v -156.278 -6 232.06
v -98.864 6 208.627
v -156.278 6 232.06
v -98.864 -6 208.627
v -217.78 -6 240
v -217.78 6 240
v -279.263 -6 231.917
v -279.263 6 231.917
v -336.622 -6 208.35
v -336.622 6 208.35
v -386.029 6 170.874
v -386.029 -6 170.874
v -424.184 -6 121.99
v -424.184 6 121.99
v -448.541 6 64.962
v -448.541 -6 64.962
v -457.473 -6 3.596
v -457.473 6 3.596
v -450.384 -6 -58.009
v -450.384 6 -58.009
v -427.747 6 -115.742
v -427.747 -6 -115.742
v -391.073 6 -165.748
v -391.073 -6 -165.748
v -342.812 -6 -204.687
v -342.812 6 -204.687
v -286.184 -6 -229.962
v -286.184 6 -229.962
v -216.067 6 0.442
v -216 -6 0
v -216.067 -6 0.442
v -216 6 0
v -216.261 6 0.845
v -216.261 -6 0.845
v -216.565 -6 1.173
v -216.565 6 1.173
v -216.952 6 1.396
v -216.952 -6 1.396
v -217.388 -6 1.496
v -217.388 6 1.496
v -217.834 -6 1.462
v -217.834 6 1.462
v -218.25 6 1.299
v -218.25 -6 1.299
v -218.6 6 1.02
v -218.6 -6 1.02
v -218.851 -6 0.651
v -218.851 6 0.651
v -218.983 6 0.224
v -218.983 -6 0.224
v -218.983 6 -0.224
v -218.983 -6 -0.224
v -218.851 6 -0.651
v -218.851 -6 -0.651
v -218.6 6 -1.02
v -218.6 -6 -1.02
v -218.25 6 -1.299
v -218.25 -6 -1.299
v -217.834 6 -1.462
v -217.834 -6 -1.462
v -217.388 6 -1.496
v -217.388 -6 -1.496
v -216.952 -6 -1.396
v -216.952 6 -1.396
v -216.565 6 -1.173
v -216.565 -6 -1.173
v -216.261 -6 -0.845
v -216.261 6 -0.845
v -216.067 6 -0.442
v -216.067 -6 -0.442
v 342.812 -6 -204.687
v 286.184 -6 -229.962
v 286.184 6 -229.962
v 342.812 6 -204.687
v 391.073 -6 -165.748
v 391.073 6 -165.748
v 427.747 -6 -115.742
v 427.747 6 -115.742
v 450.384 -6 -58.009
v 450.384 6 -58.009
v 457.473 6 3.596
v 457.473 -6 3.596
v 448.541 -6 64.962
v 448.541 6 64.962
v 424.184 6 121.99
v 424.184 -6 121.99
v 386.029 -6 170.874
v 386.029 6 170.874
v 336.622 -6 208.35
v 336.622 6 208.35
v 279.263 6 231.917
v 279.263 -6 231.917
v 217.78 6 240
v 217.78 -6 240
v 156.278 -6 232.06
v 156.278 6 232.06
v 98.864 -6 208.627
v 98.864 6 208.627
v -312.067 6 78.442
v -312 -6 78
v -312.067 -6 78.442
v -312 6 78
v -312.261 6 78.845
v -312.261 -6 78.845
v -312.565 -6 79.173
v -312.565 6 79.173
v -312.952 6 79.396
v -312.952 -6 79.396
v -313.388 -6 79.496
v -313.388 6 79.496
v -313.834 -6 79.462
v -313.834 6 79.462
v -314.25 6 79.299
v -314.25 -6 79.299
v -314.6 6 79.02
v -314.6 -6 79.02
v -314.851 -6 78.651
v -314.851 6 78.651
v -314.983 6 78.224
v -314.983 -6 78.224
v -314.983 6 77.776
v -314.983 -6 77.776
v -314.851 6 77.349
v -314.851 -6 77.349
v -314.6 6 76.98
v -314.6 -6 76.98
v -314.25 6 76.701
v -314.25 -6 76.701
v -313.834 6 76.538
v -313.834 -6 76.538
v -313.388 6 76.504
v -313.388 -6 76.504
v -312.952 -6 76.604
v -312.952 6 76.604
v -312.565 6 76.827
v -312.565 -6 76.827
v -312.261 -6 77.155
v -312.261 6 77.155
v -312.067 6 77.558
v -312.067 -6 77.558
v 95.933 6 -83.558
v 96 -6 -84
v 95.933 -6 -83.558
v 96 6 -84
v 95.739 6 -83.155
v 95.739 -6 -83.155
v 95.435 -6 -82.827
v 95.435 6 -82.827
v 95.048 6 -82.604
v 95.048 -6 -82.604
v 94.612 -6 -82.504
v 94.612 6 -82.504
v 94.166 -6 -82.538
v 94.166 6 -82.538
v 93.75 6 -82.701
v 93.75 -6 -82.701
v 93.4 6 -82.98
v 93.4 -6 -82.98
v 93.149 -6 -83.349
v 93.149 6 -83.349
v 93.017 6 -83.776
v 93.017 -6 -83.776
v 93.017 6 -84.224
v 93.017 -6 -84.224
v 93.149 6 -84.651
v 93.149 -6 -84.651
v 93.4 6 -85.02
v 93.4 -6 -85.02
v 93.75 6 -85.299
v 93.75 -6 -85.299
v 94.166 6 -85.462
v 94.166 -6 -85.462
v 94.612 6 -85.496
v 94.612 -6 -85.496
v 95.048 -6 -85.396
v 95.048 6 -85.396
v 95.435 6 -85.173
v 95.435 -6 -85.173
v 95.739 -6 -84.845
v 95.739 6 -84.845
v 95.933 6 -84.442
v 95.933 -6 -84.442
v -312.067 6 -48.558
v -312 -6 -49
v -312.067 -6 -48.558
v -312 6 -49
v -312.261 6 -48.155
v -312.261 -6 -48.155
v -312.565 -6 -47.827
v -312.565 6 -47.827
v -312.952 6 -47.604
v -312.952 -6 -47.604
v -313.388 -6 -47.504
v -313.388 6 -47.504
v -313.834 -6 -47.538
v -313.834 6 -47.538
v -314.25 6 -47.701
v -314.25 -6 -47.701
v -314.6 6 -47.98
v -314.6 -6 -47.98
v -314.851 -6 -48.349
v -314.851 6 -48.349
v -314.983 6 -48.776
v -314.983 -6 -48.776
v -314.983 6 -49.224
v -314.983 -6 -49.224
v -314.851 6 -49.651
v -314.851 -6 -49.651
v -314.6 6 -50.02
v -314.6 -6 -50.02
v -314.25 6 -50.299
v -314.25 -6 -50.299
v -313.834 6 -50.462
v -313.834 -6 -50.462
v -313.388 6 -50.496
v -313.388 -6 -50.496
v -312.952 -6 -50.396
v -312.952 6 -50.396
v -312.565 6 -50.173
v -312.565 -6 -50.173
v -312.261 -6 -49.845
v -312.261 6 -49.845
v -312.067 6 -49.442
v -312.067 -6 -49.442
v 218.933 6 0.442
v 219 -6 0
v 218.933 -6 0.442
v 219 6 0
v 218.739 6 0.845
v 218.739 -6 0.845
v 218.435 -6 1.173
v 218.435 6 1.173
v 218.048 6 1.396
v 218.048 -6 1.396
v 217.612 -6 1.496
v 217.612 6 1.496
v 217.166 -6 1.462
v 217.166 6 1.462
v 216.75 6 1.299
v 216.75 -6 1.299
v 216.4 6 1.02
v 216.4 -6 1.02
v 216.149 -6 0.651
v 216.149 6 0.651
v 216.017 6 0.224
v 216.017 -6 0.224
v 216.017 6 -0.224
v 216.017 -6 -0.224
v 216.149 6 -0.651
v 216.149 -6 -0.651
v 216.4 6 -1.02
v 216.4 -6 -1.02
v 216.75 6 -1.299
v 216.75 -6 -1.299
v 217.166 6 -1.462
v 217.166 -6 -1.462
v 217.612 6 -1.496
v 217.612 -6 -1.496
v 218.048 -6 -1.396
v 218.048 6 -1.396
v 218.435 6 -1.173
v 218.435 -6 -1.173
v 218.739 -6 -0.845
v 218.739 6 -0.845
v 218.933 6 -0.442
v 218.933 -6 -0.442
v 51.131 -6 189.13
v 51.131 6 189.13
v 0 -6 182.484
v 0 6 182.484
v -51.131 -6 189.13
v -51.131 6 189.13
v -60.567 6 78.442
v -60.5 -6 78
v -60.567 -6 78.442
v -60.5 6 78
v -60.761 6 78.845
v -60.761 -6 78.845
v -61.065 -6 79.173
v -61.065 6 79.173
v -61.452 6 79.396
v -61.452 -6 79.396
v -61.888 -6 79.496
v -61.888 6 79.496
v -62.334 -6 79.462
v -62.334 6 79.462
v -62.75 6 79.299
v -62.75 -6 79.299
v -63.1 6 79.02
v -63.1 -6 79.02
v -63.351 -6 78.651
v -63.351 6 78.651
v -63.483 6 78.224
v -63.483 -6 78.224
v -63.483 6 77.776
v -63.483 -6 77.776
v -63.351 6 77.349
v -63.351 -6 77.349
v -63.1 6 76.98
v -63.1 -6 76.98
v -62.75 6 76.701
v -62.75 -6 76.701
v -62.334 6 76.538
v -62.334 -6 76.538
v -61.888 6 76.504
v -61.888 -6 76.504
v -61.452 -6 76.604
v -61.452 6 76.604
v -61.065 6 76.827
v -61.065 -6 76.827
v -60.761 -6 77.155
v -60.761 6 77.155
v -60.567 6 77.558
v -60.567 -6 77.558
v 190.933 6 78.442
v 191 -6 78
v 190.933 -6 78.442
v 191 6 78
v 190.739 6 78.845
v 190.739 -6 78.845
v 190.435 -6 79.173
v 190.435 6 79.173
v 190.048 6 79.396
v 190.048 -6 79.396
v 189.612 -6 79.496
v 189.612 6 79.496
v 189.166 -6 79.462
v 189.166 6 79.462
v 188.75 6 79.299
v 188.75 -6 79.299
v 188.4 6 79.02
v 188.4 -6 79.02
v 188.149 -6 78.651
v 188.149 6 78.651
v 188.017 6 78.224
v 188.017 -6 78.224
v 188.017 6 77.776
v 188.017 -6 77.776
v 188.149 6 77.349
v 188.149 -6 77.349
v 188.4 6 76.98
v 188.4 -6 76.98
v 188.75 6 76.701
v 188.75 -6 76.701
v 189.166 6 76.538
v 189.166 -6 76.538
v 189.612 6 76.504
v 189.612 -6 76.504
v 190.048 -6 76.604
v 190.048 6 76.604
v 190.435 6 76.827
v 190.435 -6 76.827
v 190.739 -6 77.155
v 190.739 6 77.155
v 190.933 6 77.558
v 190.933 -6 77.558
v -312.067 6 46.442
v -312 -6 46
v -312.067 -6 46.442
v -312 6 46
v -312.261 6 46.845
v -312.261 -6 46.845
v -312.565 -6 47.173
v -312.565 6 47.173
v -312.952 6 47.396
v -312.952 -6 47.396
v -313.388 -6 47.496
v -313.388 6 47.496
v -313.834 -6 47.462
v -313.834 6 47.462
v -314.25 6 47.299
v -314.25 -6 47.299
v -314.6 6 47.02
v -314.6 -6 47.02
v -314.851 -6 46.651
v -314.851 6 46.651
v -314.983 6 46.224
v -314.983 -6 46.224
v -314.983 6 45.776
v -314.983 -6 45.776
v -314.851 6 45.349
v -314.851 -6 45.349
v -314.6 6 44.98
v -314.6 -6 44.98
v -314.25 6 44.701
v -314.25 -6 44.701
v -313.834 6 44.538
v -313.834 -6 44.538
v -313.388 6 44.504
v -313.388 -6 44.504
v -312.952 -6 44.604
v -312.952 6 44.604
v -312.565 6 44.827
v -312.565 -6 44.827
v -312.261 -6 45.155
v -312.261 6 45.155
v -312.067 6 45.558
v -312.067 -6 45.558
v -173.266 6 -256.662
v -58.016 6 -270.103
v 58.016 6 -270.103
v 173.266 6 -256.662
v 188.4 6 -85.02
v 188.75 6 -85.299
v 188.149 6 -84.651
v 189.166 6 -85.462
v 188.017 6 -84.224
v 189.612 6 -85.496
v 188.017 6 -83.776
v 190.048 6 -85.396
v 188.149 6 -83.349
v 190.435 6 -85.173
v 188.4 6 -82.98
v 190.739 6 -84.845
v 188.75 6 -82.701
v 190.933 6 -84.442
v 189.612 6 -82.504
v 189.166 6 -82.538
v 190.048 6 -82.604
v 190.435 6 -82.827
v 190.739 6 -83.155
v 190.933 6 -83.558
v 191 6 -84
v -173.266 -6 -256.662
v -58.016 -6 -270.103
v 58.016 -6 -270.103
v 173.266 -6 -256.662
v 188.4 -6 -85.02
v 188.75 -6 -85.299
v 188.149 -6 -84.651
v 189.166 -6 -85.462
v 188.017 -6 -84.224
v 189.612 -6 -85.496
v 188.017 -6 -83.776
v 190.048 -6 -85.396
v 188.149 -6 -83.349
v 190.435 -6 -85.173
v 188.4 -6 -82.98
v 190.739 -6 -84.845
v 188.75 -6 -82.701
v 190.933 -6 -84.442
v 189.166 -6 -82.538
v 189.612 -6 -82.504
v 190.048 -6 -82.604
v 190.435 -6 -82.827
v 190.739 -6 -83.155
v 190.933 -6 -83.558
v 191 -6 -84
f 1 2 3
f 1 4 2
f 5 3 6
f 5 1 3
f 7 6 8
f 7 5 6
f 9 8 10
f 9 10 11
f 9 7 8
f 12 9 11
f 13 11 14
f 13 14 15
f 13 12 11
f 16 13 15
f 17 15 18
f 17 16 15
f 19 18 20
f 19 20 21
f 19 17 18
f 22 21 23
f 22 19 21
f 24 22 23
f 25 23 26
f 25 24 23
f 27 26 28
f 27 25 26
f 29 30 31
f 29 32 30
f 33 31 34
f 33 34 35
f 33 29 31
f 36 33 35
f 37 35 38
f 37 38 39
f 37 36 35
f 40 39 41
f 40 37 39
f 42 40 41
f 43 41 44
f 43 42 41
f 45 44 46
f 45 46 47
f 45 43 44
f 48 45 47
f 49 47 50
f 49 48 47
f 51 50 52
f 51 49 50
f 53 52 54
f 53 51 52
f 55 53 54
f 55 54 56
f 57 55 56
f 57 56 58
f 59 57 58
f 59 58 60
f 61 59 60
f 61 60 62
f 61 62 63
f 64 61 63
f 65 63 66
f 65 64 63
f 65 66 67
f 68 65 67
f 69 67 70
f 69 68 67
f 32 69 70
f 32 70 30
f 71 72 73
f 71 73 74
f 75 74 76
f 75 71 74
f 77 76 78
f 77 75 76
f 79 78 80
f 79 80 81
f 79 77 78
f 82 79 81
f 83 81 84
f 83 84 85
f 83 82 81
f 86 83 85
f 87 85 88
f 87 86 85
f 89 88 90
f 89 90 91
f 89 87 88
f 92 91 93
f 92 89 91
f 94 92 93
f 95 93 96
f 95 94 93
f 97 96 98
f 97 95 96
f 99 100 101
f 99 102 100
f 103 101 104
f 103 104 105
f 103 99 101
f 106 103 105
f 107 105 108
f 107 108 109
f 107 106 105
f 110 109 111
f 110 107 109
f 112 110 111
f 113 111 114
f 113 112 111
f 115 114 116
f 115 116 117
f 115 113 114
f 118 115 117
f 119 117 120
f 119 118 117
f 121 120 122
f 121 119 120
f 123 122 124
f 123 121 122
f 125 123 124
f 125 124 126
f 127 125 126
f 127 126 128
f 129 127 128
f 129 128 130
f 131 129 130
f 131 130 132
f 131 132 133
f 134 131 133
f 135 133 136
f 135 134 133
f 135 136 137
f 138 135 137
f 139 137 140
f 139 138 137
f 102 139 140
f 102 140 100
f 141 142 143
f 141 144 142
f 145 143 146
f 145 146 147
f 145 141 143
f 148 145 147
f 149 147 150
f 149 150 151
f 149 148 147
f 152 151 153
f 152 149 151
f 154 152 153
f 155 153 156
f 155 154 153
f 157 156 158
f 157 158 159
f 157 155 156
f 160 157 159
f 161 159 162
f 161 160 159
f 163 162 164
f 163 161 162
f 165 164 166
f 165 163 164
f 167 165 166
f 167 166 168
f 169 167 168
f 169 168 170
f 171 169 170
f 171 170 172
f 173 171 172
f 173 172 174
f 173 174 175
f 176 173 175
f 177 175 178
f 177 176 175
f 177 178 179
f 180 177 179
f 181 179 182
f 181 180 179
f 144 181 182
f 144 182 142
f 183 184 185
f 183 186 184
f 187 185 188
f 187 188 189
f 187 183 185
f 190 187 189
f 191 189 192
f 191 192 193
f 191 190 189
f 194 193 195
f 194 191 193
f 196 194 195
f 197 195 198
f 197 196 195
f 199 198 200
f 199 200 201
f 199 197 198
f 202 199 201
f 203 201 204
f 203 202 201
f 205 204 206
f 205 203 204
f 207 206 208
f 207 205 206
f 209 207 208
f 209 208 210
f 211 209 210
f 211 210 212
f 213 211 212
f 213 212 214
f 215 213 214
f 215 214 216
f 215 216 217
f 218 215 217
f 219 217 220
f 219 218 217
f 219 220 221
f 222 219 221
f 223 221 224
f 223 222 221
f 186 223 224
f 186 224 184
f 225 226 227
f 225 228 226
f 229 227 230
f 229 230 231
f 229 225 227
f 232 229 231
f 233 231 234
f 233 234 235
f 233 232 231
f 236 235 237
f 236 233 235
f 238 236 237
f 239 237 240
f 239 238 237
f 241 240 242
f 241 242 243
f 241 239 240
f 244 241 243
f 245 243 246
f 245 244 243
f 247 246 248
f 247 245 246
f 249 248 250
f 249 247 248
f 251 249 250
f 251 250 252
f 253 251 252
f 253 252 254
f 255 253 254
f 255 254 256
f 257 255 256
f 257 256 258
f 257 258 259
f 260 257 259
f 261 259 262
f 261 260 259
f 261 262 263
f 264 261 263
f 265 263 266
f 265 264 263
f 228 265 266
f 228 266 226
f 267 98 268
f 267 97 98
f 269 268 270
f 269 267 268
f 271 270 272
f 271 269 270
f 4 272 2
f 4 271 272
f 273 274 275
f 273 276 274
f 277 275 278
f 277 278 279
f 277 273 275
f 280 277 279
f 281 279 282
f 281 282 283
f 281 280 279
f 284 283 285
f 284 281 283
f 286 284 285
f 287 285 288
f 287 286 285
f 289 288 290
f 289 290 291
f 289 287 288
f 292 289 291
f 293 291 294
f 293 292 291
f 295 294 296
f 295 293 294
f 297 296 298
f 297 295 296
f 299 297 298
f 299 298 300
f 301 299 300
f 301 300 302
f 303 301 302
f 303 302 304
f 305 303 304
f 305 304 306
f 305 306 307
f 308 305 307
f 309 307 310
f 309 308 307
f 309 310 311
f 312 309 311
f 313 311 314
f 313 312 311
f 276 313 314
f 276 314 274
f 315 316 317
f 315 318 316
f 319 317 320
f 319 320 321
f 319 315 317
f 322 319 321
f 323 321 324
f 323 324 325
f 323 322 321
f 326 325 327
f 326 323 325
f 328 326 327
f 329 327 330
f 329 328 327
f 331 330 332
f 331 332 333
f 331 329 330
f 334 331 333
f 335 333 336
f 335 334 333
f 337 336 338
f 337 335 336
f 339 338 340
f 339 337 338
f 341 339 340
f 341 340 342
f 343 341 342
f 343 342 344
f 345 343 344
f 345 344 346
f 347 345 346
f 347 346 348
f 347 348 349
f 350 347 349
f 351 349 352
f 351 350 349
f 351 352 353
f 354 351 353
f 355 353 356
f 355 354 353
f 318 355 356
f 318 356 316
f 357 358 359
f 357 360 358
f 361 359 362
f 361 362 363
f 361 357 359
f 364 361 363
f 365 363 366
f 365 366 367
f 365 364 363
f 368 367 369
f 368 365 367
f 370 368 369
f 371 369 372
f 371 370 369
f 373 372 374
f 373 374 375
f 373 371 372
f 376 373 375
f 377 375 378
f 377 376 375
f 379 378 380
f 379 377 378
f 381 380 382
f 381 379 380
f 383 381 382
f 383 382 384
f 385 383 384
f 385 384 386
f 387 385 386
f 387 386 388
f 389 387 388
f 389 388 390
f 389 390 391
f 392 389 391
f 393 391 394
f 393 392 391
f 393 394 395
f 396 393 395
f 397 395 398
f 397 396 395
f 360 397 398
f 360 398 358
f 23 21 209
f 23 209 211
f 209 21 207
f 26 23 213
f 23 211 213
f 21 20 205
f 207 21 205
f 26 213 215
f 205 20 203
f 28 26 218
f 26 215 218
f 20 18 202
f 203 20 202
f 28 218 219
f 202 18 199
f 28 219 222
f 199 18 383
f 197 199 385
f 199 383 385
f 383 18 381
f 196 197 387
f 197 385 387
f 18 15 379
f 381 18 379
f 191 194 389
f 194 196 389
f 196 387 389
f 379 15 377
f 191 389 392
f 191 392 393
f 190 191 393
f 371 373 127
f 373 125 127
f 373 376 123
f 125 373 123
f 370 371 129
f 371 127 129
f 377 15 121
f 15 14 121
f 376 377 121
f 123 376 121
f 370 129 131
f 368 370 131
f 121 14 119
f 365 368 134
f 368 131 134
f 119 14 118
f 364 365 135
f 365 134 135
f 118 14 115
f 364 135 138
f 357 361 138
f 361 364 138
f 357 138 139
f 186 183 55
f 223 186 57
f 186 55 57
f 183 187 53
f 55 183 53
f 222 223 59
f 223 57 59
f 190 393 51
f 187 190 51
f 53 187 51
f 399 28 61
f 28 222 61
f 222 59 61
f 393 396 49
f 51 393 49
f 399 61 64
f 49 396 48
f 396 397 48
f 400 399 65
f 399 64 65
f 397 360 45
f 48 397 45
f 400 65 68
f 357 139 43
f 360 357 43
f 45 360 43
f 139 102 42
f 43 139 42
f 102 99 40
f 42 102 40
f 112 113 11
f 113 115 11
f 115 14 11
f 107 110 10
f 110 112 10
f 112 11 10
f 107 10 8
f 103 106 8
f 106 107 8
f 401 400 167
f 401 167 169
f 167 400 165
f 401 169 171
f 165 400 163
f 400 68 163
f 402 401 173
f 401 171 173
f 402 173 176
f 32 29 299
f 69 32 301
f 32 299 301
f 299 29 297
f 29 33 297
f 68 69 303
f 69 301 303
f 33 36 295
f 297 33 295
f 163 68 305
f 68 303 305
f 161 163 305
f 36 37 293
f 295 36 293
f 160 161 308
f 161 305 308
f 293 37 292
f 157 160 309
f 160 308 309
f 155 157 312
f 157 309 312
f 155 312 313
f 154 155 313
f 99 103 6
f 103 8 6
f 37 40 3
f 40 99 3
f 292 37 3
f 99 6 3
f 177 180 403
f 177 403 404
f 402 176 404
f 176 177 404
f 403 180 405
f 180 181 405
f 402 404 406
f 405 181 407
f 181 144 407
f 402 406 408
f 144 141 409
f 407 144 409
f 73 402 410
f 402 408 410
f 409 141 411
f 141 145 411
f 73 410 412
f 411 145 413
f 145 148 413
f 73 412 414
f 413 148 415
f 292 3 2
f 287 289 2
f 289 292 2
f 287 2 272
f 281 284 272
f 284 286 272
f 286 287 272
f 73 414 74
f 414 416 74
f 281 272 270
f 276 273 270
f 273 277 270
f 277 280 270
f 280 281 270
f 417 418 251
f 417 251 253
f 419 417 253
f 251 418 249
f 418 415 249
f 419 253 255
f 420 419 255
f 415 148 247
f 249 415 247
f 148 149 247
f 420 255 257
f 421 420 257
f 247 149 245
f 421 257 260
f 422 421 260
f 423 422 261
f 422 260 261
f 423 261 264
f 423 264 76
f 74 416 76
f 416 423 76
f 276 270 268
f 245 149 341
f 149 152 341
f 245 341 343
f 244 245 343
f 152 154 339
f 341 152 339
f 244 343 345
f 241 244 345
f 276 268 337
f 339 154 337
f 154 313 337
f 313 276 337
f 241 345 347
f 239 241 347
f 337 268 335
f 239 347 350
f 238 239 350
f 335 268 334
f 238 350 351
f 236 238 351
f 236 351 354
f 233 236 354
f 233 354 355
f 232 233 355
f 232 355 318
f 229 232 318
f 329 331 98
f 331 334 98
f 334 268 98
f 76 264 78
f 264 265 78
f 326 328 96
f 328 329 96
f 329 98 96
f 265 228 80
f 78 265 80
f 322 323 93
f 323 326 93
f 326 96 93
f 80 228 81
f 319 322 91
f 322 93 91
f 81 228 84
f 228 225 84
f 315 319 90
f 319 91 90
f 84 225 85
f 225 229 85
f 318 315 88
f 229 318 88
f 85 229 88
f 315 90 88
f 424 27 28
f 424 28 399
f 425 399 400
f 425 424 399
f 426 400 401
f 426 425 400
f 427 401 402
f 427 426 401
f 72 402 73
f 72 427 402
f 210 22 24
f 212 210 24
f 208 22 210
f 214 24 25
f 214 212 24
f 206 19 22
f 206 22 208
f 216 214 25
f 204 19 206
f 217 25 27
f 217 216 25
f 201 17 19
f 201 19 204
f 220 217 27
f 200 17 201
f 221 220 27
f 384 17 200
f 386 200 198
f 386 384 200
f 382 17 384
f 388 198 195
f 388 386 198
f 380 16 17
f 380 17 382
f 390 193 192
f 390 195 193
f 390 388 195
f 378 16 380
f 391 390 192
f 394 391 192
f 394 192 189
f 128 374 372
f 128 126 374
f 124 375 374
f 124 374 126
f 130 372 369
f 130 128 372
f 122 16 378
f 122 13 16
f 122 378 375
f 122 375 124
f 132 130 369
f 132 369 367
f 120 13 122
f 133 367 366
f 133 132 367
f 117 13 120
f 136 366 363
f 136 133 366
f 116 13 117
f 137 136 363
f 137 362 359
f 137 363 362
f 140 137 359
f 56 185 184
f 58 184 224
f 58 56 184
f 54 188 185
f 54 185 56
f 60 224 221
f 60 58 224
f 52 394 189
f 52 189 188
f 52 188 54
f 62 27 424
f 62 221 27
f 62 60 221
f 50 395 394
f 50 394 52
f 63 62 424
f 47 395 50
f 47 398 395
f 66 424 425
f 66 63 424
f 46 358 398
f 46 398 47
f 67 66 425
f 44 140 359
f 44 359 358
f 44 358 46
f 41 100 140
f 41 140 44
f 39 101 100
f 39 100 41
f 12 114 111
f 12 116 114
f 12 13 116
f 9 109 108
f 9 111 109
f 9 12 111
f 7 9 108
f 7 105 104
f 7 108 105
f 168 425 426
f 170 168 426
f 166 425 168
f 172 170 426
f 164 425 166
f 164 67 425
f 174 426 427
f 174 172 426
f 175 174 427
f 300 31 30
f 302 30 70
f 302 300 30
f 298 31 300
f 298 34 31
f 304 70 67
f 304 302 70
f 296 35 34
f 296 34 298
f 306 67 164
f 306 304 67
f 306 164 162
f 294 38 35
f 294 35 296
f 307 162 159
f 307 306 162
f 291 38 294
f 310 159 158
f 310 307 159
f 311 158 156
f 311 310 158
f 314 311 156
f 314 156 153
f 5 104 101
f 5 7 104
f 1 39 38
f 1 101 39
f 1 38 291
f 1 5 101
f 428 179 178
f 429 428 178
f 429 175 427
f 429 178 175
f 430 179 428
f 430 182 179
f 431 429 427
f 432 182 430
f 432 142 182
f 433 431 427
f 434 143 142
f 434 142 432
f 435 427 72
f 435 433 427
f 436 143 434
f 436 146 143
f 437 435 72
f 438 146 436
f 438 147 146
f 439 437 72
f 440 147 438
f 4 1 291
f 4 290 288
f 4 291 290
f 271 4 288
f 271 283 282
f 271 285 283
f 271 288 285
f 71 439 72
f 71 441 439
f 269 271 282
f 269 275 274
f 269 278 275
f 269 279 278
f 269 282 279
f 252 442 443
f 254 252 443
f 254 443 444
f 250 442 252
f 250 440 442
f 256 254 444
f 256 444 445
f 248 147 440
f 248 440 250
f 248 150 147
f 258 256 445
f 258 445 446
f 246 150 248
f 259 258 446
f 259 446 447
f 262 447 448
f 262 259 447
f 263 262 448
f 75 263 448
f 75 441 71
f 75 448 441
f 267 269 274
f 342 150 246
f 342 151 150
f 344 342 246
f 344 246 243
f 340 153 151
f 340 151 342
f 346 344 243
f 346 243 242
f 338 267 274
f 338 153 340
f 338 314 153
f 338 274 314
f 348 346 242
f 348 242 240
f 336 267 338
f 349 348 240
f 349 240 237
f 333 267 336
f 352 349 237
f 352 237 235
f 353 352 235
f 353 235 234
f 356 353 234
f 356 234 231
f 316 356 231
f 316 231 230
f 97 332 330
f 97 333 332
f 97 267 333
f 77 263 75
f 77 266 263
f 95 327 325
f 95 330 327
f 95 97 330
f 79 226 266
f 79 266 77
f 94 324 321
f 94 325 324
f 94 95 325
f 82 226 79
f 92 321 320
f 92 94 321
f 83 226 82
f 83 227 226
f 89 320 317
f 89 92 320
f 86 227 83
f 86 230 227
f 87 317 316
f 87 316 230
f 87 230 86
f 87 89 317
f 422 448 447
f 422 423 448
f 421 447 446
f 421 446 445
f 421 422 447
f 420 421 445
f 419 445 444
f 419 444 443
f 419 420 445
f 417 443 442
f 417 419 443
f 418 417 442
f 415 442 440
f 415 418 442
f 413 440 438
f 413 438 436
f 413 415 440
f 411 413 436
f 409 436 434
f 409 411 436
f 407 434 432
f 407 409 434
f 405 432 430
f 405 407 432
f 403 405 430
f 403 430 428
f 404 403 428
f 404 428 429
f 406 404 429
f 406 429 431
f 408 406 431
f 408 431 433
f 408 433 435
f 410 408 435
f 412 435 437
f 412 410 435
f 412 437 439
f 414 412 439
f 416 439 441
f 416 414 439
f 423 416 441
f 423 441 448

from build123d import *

# Parameters (mm, degrees)
F0_R     = 1.5
F1_DEPTH = 6


with BuildPart() as f1:
    # F0 (on Front) → F1 (new body, symmetric)
    with BuildSketch(Plane.XZ):
        with BuildLine():
            ThreePointArc((-98.8636363636, 208.62745079), (-438.2123939781, 94.2657898945), (-286.1842105263, -229.961908203))
            ThreePointArc((-286.1842105263, -229.961908203), (0, -271.7872906904), (286.1842105263, -229.961908203))
            ThreePointArc((286.1842105263, -229.961908203), (438.2123939781, 94.2657898945), (98.8636363636, 208.62745079))
            ThreePointArc((98.8636363636, 208.62745079), (0, 182.4836597817), (-98.8636363636, 208.62745079))
        make_face()
        with Locations((-313.5, -49)):
            Circle(F0_R, mode=Mode.SUBTRACT)
        with Locations((94.5, -84)):
            Circle(F0_R, mode=Mode.SUBTRACT)
        with Locations((189.5, -84)):
            Circle(F0_R, mode=Mode.SUBTRACT)
        with Locations((-313.5, 46)):
            Circle(F0_R, mode=Mode.SUBTRACT)
        with Locations((-313.5, 78)):
            Circle(F0_R, mode=Mode.SUBTRACT)
        with Locations((-217.5, 0)):
            Circle(F0_R, mode=Mode.SUBTRACT)
        with Locations((-62, 78)):
            Circle(F0_R, mode=Mode.SUBTRACT)
        with Locations((217.5, 0)):
            Circle(F0_R, mode=Mode.SUBTRACT)
        with Locations((189.5, 78)):
            Circle(F0_R, mode=Mode.SUBTRACT)
    extrude(amount=F1_DEPTH, both=True)


solid = f1.part
